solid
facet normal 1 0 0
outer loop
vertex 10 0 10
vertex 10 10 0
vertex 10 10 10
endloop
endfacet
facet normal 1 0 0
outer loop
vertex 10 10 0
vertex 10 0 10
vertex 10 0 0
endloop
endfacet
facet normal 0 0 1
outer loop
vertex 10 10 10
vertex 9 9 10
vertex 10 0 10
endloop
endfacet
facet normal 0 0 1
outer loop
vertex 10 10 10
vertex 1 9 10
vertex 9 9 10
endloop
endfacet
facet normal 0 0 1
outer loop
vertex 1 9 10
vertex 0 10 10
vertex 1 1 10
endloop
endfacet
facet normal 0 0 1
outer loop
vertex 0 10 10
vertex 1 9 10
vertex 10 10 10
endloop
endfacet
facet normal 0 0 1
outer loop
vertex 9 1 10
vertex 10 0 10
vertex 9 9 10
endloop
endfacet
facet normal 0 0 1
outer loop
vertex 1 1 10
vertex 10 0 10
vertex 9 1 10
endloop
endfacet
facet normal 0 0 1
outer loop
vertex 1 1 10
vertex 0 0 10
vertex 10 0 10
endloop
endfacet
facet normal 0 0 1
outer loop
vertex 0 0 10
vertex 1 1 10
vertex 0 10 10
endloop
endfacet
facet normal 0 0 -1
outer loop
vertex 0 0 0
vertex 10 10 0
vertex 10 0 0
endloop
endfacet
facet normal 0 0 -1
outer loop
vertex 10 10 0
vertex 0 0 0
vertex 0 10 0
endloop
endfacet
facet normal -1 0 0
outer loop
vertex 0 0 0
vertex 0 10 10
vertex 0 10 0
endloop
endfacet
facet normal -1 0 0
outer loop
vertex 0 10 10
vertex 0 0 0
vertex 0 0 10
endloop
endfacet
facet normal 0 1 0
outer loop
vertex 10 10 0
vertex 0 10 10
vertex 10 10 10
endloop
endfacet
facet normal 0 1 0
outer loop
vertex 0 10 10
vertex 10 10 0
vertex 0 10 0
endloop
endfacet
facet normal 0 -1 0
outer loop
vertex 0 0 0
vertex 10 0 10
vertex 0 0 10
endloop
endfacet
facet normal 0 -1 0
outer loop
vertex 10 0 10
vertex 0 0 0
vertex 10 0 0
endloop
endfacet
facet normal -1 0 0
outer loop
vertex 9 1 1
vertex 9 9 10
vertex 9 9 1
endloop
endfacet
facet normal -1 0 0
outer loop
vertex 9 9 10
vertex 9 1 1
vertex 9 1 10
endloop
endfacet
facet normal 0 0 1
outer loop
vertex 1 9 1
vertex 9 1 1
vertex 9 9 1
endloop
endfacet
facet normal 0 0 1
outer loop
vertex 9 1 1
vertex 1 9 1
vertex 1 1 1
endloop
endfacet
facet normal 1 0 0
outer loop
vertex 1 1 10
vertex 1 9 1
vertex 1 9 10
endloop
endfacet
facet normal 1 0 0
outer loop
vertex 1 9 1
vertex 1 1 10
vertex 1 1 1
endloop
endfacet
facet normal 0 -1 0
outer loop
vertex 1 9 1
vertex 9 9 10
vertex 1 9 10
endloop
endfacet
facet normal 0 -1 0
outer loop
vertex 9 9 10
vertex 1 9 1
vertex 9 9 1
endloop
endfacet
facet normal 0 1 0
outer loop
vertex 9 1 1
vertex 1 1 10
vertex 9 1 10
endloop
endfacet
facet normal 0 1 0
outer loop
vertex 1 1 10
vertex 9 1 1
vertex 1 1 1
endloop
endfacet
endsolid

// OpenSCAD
$fn = 30;

module fillet_cube(size=10, r=1, center=false, flat_top=false, flat_bottom=false) {
    size = is_num(size) ? [size, size, size] : size;
    top_multiplier = flat_top ? 1 : 0;
    bottom_multiplier = flat_bottom ? 1 : 0;
    assert(size[0] > r * 2, "x size smaller than diameter");
    assert(size[1] > r * 2, "y size smaller than diameter");
    assert(size[2] > r * (2 - top_multiplier - bottom_multiplier), "z size smaller than diameter");
    cube_size = [size[0] - r * 2, size[1] - r * 2, size[2] + r * (top_multiplier + bottom_multiplier -2)];
    translate_vector = center ? [0, 0, 0] : [size[0] / 2, size[1] / 2, size[2] / 2];
    translate(translate_vector) {
        difference() {
            minkowski() {
                translate([0, 0, (r * top_multiplier) / 2 - (r * bottom_multiplier) / 2]) {
                    cube(cube_size, center=true);
                }
                sphere(r=r);
            }
            translate([0, 0, size[2]]) {
                cube(size, center=true);
            }
            translate([0, 0, -size[2]]) {
                cube(size, center=true);
            }
        }
    }
}


module box(size=10, w=1, external_radius=0, internal_radius=0, center=false, flat_bottom=false) {
    size = is_num(size) ? [size, size, size] : size;
    external_size = [size[0], size[1], size[2]];
    internal_size = [size[0] - w * 2, size[1] - w * 2, size[2]];
    translate_vector = center ? [0, 0, 0] : [size[0] / 2, size[1] / 2, size[2] / 2];
    translate(translate_vector) {
        difference() {
            fillet_cube(external_size, r=external_radius, center=true, flat_top=true, flat_bottom=flat_bottom);
            translate([0, 0, w]) {
                fillet_cube(internal_size, r=internal_radius, center=true, flat_top=true, flat_bottom=false);
            }
        }
    }
}

// difference() {
//     box([80, 40, 20], w=1, external_radius=5, internal_radius=4, center=false, flat_bottom=true);
//     translate([50, 0, -1]) cube([100, 100, 100], center=false);
// }

box();
// box([50, 50, 30], w=1, external_radius=5, internal_radius=4, center=false, flat_bottom=true);
